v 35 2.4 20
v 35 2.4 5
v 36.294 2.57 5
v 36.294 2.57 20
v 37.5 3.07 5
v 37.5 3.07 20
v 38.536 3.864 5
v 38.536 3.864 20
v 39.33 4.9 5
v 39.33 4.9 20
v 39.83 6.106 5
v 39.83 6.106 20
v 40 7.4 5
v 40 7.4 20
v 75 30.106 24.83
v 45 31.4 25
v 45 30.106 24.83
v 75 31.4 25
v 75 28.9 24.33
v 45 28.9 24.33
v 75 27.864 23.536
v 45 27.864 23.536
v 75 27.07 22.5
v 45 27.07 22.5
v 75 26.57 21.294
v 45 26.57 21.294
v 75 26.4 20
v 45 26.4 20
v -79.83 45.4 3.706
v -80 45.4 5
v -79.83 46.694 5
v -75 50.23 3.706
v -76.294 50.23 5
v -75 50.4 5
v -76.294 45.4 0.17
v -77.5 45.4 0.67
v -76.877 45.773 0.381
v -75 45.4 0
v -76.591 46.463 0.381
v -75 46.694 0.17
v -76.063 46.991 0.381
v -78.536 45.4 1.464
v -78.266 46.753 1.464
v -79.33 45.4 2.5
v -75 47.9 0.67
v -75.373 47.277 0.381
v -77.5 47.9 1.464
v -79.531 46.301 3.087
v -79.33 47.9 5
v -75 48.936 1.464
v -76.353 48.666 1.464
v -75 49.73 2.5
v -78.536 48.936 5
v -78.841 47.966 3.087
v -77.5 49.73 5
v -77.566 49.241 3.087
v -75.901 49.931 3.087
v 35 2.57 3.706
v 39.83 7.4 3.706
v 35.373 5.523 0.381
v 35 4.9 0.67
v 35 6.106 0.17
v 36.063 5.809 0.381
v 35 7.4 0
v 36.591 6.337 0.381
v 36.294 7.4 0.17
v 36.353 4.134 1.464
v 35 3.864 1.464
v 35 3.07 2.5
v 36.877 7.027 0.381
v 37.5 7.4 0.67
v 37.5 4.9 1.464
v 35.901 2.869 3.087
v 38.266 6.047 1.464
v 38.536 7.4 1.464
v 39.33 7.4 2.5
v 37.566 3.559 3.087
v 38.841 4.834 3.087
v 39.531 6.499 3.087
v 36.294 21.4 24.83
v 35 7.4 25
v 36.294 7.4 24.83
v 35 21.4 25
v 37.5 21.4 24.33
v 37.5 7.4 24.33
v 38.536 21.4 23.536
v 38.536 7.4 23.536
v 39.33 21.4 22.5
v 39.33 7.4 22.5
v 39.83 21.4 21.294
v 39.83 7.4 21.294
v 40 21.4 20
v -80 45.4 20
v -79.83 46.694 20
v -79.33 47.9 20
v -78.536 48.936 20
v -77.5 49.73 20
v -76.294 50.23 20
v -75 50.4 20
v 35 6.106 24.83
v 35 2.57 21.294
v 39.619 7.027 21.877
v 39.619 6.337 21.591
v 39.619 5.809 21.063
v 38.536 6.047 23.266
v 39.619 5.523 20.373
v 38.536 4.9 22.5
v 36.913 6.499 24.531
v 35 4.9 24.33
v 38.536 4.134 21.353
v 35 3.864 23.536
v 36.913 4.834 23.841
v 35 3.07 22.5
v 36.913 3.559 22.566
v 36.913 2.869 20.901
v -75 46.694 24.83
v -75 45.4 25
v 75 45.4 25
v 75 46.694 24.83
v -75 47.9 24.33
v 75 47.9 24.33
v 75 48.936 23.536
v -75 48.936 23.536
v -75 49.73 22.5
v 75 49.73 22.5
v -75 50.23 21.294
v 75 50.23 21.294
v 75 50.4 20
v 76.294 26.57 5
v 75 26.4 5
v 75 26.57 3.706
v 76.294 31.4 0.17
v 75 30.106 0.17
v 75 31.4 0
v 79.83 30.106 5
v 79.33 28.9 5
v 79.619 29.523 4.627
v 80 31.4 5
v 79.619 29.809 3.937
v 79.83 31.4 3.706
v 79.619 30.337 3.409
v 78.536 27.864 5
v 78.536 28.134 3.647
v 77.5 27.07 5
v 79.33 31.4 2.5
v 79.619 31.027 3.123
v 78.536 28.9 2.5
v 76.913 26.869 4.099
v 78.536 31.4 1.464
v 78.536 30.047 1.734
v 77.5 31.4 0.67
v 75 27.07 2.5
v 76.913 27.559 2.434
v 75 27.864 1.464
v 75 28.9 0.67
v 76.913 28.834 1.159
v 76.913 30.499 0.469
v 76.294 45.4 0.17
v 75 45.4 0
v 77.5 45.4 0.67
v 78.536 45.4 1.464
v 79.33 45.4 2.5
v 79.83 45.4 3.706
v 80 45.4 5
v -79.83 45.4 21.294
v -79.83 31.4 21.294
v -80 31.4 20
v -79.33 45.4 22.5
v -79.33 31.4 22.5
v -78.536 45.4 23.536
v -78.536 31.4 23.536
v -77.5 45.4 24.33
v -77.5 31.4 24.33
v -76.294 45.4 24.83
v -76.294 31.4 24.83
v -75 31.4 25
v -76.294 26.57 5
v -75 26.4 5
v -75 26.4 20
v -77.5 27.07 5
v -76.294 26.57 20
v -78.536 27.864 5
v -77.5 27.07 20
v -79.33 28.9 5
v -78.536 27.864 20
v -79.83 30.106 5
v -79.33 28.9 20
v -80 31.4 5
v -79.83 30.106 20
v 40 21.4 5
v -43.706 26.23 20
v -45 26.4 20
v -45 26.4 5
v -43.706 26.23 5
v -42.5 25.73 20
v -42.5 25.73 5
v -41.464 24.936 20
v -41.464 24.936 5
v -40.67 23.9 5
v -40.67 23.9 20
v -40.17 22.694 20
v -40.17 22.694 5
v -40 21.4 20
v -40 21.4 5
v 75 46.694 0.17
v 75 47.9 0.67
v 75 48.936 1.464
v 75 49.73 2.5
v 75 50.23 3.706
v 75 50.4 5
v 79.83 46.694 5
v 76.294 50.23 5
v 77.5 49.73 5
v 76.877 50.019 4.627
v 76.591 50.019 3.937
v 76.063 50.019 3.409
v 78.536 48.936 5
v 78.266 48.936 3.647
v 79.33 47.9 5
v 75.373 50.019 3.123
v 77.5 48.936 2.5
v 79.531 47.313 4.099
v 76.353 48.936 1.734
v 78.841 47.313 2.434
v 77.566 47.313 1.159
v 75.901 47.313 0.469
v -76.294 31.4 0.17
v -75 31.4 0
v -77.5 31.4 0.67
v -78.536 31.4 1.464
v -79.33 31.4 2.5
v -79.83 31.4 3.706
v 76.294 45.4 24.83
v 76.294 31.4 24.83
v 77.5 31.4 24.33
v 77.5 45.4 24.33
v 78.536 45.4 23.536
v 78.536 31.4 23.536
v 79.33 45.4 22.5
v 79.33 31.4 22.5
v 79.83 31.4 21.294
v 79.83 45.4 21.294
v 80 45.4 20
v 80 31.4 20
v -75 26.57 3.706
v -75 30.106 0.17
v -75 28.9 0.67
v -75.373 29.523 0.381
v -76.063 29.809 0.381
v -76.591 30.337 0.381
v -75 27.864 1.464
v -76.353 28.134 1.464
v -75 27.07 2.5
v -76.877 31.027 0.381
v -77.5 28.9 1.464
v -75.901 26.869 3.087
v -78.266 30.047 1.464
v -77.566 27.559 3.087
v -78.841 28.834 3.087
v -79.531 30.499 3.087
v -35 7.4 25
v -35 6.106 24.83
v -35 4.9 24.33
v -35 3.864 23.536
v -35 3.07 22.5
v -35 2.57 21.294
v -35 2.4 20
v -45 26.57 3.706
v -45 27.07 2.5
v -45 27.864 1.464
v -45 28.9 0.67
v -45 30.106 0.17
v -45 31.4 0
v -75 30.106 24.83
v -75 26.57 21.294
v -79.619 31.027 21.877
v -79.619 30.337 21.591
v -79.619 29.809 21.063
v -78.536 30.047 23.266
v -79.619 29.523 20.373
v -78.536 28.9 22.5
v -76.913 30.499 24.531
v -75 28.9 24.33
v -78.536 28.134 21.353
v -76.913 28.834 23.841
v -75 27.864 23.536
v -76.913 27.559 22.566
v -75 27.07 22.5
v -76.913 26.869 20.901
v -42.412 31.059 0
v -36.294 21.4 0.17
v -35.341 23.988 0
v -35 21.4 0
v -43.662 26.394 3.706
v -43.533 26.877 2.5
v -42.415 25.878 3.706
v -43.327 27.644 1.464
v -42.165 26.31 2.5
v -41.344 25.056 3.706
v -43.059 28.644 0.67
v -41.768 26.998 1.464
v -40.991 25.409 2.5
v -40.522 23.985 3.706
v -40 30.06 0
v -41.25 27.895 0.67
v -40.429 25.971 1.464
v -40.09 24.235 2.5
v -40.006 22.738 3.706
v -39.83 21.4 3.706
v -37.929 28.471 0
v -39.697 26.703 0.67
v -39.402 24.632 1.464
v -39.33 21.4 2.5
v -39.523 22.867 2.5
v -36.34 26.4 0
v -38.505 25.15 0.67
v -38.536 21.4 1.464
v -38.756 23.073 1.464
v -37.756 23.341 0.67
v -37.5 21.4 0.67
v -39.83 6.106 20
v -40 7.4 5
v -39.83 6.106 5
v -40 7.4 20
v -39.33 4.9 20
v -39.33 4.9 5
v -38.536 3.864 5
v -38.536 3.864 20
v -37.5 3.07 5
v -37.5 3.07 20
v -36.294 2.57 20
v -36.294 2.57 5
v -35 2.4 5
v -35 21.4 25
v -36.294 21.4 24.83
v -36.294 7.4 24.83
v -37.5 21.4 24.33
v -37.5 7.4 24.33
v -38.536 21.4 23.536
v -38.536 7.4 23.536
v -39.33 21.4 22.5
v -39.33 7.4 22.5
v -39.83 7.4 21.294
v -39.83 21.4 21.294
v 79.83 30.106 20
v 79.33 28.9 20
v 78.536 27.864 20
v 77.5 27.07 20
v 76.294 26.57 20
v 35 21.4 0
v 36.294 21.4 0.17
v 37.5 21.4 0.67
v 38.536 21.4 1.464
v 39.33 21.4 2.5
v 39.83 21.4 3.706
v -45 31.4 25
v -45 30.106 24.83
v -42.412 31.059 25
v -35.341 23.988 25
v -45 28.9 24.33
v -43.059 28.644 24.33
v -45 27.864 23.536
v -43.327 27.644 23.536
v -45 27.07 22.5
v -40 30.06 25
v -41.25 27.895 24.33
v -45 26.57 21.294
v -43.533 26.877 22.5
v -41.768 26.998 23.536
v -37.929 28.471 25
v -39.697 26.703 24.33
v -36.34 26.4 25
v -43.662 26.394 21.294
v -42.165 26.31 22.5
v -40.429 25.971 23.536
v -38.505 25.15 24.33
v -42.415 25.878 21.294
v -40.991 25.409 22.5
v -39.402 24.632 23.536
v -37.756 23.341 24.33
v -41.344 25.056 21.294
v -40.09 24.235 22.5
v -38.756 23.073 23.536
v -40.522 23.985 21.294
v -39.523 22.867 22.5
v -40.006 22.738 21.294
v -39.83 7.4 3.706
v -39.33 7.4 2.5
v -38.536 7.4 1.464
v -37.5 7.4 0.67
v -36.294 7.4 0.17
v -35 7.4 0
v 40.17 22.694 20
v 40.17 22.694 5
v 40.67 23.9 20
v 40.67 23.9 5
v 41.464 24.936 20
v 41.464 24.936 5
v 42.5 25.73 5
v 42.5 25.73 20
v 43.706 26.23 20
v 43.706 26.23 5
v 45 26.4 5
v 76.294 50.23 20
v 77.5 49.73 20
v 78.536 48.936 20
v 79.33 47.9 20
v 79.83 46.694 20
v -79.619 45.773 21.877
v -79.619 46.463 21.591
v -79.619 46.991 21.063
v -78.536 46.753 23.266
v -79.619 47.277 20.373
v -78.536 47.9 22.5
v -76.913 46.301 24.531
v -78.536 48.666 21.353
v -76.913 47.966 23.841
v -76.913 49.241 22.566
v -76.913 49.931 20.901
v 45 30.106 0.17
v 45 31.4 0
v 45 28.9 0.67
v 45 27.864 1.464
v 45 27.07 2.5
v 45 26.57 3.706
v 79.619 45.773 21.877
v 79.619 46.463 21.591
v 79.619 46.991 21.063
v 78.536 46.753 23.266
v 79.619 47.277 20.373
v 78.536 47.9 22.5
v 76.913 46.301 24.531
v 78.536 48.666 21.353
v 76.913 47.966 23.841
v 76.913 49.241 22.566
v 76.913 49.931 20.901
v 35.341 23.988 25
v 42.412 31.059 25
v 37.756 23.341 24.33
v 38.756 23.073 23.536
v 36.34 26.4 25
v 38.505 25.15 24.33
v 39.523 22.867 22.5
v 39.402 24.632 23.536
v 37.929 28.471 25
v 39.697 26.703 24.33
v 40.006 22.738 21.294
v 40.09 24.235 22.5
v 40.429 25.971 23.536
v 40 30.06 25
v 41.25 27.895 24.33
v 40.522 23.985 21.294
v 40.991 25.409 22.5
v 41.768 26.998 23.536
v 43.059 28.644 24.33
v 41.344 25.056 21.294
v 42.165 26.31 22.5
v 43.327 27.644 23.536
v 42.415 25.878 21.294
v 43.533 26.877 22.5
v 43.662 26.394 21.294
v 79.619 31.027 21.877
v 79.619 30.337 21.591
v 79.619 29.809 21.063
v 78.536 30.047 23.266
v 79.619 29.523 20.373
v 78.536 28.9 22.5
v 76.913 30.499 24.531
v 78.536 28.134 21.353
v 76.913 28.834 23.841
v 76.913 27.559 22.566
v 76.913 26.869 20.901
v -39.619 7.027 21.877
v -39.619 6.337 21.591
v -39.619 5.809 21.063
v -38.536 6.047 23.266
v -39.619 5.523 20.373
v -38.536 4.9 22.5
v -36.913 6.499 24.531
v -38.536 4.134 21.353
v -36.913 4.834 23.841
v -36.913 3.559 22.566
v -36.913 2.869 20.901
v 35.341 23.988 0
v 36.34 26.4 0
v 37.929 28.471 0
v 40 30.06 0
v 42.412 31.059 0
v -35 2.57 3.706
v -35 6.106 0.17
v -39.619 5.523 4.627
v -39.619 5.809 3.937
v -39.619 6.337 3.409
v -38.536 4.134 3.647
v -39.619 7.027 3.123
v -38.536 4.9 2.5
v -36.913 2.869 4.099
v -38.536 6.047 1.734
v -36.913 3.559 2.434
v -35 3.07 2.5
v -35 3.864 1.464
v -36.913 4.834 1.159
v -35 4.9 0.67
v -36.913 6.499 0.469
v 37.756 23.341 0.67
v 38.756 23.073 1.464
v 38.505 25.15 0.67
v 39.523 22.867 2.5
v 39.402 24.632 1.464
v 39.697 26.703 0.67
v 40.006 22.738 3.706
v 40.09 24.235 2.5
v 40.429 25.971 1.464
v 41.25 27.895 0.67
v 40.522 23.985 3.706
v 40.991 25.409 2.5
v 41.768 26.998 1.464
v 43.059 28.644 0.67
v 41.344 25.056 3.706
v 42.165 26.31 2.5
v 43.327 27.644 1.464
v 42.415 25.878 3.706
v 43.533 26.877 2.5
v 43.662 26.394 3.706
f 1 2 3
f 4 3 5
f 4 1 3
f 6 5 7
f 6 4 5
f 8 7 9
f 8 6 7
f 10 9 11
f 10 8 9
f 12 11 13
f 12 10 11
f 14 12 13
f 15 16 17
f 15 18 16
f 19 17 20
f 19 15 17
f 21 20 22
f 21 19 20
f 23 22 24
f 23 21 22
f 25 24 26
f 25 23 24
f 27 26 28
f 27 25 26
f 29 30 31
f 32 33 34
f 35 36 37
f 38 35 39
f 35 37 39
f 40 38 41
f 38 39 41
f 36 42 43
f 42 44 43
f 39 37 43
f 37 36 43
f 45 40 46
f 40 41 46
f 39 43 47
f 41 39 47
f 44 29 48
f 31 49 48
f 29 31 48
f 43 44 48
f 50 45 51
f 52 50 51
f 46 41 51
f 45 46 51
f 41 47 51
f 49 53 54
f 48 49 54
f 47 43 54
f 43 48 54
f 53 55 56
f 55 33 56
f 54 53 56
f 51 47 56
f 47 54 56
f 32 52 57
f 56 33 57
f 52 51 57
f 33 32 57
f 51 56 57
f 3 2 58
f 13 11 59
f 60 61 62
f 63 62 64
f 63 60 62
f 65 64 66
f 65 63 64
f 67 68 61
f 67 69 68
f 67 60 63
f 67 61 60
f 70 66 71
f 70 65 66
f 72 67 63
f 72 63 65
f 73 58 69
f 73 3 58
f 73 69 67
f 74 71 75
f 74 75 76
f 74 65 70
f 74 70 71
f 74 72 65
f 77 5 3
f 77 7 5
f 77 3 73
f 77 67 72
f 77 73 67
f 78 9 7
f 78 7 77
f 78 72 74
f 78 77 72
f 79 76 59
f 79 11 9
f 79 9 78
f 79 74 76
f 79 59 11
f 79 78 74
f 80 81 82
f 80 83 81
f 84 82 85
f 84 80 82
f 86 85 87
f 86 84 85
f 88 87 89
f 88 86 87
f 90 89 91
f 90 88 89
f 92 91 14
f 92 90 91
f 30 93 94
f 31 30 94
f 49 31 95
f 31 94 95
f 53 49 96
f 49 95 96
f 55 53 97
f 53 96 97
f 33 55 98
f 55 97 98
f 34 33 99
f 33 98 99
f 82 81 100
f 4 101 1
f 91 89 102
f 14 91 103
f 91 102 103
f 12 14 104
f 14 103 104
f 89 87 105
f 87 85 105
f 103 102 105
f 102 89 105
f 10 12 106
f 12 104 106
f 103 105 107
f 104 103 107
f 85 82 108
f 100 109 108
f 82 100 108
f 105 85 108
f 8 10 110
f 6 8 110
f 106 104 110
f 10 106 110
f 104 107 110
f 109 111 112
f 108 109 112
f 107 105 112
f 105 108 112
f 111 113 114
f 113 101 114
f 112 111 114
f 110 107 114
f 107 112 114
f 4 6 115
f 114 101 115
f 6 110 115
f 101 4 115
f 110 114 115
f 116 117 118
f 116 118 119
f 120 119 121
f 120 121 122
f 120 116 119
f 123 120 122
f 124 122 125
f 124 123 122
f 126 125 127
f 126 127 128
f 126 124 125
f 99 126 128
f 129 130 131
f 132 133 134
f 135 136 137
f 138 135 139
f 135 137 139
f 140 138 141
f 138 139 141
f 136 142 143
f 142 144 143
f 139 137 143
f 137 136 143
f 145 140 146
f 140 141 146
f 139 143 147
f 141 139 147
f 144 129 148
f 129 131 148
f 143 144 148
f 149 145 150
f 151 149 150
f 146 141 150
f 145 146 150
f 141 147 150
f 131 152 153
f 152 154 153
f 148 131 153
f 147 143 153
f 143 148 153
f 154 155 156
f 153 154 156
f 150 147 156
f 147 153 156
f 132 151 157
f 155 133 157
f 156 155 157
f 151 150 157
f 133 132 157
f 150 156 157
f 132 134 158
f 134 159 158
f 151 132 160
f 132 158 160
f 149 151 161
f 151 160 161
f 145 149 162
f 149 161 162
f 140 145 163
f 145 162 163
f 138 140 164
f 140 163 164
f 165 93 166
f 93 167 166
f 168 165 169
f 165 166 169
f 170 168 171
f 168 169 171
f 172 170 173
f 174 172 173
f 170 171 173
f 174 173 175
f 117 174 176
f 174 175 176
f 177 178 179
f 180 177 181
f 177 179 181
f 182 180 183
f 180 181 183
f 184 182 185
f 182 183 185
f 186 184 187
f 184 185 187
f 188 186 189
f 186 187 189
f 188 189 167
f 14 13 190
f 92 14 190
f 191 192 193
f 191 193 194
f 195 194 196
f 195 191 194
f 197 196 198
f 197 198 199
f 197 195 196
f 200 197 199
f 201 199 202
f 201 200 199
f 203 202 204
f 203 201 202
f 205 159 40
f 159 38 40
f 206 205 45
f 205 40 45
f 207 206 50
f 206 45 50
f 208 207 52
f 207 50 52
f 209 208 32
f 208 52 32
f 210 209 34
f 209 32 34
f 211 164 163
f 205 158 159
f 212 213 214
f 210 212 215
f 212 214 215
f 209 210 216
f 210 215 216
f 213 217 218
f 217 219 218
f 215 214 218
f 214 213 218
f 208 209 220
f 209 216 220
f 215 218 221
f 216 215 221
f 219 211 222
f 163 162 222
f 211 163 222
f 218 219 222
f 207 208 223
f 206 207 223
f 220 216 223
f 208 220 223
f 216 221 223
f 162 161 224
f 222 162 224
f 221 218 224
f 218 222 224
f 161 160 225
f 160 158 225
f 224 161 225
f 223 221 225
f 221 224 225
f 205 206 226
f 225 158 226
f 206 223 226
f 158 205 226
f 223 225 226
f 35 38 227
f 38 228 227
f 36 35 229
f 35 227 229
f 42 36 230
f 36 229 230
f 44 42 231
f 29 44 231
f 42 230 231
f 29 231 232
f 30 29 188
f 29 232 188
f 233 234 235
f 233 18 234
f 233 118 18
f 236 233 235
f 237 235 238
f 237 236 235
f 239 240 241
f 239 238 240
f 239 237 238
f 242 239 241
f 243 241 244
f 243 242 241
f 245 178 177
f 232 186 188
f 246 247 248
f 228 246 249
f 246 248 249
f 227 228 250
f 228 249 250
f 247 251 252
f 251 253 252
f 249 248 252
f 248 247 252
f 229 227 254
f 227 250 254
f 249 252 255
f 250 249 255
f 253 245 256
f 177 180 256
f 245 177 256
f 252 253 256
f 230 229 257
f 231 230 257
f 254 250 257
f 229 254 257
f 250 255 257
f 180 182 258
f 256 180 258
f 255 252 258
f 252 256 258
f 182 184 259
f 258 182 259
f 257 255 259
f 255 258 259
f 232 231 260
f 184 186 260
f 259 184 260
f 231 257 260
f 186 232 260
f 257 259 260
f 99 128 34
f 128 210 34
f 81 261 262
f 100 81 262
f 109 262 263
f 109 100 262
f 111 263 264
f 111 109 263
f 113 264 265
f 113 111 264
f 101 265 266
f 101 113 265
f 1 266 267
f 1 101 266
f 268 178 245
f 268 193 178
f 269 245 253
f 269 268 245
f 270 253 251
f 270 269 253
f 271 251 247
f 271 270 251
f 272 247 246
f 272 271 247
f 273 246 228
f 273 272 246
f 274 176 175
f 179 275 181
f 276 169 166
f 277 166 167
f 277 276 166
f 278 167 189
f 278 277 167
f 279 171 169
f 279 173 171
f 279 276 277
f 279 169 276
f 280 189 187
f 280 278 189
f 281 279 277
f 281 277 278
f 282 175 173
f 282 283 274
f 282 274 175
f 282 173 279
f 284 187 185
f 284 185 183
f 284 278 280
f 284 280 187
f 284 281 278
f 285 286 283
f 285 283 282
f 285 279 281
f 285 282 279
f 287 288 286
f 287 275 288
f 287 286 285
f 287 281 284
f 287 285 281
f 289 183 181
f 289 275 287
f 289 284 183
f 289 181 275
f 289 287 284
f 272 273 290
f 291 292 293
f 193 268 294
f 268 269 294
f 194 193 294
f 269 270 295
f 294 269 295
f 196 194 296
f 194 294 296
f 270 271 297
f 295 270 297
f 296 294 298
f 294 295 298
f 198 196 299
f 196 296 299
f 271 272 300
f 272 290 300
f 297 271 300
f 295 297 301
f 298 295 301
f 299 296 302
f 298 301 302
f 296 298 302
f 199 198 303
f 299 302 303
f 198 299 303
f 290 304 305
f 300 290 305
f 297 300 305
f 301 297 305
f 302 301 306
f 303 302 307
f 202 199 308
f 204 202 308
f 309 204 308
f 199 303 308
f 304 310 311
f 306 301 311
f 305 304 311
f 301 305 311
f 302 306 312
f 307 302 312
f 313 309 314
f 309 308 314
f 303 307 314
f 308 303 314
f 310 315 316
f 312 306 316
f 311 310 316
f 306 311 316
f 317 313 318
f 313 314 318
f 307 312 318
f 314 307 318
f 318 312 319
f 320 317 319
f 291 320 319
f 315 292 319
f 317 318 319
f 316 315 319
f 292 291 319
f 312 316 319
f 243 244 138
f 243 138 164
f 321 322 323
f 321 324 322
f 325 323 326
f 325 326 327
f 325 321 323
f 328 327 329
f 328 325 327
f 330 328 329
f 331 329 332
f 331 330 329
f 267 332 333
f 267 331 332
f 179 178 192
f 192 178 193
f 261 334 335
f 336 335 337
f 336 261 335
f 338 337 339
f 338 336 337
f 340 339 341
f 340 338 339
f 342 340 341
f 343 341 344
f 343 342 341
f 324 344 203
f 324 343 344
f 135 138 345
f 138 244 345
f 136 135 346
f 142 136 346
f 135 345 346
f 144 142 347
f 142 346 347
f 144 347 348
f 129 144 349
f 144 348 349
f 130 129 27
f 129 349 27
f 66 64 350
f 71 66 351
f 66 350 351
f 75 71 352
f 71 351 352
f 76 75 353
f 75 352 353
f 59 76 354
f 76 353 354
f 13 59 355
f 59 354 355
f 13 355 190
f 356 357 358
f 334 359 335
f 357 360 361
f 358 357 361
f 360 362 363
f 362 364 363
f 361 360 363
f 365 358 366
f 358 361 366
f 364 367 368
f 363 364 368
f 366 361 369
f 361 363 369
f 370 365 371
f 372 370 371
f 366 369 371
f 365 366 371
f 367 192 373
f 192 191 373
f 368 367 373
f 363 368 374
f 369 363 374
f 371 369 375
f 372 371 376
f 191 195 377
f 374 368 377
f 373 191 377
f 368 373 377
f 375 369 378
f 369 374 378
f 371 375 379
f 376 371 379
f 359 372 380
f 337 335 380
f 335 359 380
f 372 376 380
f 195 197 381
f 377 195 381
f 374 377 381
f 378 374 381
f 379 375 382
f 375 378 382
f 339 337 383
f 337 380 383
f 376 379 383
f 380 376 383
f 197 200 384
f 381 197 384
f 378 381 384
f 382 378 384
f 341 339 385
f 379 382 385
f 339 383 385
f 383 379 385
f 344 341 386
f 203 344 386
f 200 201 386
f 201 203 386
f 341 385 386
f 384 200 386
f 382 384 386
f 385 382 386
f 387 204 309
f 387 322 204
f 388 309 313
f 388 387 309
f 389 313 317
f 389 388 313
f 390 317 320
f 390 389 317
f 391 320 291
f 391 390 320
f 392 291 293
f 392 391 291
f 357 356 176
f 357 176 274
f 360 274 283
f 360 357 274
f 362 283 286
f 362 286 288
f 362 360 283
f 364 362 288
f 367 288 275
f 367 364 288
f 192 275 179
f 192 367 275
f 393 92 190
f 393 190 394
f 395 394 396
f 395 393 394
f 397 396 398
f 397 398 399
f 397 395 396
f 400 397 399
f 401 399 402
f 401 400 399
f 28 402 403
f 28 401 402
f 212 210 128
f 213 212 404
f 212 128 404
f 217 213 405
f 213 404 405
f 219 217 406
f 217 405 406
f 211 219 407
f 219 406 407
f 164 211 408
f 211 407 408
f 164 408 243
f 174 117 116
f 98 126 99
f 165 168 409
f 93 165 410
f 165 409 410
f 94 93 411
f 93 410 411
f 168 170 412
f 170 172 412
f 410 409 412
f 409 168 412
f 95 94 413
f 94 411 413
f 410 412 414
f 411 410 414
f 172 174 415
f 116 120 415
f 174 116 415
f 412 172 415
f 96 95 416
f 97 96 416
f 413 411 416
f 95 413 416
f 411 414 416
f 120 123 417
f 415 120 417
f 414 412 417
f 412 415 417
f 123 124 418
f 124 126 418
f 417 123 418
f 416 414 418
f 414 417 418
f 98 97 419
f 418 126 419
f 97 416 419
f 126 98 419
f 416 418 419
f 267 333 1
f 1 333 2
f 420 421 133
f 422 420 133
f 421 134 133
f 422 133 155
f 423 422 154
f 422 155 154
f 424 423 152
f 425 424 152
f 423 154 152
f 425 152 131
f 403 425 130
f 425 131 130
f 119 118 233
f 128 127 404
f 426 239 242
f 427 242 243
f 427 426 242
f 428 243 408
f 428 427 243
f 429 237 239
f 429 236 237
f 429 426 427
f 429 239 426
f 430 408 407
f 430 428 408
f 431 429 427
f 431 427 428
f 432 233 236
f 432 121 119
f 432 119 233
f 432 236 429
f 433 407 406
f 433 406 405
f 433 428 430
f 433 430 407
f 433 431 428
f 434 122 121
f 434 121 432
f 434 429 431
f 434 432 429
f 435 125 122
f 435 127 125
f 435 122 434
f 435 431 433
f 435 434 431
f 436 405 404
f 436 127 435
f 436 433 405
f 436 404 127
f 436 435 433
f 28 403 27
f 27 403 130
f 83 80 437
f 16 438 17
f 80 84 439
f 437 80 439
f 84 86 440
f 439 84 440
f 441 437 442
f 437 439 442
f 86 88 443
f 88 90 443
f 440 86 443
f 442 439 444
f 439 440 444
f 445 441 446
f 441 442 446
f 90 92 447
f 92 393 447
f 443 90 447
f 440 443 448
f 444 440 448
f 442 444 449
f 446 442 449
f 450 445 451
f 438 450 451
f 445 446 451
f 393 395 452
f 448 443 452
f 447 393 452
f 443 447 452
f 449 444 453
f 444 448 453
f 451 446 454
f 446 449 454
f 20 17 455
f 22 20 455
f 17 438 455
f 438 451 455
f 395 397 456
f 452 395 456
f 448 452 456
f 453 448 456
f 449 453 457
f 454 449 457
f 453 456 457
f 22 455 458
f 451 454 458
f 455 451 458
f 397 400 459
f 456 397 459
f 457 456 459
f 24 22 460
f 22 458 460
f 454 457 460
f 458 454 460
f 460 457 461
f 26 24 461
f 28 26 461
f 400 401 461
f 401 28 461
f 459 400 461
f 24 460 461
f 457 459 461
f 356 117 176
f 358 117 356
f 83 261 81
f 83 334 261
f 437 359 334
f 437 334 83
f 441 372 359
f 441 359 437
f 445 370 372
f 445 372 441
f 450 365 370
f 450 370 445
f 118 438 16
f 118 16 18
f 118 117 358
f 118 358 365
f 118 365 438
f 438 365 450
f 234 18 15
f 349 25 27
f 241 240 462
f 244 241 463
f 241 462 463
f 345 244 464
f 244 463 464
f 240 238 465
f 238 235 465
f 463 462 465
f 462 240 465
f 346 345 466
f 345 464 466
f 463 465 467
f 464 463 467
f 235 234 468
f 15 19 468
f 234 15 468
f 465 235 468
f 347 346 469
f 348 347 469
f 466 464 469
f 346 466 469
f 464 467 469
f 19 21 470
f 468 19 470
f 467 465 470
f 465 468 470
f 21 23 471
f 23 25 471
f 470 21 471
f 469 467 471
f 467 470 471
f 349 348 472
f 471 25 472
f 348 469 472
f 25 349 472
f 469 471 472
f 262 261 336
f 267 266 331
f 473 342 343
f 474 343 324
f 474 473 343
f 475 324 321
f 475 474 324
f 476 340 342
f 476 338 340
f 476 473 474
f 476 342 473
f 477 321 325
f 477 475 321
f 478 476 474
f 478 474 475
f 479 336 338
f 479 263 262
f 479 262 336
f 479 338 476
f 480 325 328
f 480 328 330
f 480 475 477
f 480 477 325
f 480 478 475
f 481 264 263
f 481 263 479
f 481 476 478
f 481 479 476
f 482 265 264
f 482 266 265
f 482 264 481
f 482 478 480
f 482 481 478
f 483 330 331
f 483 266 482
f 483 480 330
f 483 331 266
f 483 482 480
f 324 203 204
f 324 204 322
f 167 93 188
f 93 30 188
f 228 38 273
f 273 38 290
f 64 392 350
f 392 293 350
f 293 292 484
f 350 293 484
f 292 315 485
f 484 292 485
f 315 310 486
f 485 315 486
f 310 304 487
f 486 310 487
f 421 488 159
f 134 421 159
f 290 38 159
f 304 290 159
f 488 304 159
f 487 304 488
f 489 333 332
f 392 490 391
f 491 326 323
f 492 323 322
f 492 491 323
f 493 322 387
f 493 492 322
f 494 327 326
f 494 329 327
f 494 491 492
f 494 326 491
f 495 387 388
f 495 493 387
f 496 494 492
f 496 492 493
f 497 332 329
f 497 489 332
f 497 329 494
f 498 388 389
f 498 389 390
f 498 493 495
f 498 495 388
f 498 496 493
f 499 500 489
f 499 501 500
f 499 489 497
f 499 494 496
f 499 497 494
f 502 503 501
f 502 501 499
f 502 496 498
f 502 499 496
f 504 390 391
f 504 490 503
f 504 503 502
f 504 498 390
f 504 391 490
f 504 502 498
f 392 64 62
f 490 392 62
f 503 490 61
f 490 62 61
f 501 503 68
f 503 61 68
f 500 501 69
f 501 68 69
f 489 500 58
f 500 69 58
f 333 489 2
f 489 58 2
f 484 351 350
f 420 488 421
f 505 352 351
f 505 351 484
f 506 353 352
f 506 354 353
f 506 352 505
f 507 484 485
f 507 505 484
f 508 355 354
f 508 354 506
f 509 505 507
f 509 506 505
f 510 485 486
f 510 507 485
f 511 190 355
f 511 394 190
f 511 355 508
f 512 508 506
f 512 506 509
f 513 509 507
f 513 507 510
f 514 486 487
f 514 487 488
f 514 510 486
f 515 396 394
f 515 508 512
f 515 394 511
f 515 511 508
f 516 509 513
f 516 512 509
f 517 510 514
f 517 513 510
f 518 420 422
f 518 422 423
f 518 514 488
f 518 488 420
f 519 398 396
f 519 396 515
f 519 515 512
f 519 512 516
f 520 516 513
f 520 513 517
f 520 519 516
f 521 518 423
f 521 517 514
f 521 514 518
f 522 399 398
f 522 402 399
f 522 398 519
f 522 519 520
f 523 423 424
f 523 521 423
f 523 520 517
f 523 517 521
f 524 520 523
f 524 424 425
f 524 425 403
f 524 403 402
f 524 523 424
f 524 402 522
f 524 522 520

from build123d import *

# Parameters (mm, degrees)
F1_DEPTH = 25
F2_F1_R  = 5
F2_F2_R  = 5


with BuildPart() as f1:
    # F0 (on Top) → F1 (new body)
    with BuildSketch(Plane.XY):
        Polygon((0, 50.3999988563), (-80, 50.3999988563), (-80, 26.3999988563), (-40, 26.3999988563), (-40, 2.3999988563), (40, 2.3999988563), (40, 26.3999988563), (80, 26.3999988563), (80, 50.3999988563), align=None)
    extrude(amount=F1_DEPTH)

    # F2: fillet of radius 5 on 23 edges, made by hand

    # F2_f1
    f2_f1_edges = [f1.edges().sort_by_distance(p)[0] for p in [
        (40, 26.3999988563, 12.5),
        (-40, 26.3999988563, 12.5),
    ]]
    fillet(f2_f1_edges, radius=F2_F1_R)

    # F2_f2
    f2_f2_edges = [f1.edges().sort_by_distance(p)[0] for p in [
        (0, 2.3999988563, 25),
        (-40, 11.8999988563, 25),
        (0, 50.3999988563, 25),
        (-80, 38.3999988563, 25),
        (-62.5, 26.3999988563, 25),
        (40, 11.8999988563, 25),
        (62.5, 26.3999988563, 25),
        (80, 38.3999988563, 25),
        (40, 2.3999988563, 12.5),
        (0, 2.3999988563, 0),
        (40, 11.8999988563, 0),
        (62.5, 26.3999988563, 0),
        (80, 26.3999988563, 12.5),
        (80, 38.3999988563, 0),
        (80, 50.3999988563, 12.5),
        (-40, 2.3999988563, 12.5),
        (-80, 26.3999988563, 12.5),
        (-62.5, 26.3999988563, 0),
        (-80, 50.3999988563, 12.5),
        (-80, 38.3999988563, 0),
        (0, 50.3999988563, 0),
        (-41.4644660941, 24.9355327622, 0),
        (41.4644660941, 24.9355327622, 0),
        (41.4644660941, 24.9355327622, 25),
        (-41.4644660941, 24.9355327622, 25),
    ]]
    fillet(f2_f2_edges, radius=F2_F2_R)


solid = f1.part
